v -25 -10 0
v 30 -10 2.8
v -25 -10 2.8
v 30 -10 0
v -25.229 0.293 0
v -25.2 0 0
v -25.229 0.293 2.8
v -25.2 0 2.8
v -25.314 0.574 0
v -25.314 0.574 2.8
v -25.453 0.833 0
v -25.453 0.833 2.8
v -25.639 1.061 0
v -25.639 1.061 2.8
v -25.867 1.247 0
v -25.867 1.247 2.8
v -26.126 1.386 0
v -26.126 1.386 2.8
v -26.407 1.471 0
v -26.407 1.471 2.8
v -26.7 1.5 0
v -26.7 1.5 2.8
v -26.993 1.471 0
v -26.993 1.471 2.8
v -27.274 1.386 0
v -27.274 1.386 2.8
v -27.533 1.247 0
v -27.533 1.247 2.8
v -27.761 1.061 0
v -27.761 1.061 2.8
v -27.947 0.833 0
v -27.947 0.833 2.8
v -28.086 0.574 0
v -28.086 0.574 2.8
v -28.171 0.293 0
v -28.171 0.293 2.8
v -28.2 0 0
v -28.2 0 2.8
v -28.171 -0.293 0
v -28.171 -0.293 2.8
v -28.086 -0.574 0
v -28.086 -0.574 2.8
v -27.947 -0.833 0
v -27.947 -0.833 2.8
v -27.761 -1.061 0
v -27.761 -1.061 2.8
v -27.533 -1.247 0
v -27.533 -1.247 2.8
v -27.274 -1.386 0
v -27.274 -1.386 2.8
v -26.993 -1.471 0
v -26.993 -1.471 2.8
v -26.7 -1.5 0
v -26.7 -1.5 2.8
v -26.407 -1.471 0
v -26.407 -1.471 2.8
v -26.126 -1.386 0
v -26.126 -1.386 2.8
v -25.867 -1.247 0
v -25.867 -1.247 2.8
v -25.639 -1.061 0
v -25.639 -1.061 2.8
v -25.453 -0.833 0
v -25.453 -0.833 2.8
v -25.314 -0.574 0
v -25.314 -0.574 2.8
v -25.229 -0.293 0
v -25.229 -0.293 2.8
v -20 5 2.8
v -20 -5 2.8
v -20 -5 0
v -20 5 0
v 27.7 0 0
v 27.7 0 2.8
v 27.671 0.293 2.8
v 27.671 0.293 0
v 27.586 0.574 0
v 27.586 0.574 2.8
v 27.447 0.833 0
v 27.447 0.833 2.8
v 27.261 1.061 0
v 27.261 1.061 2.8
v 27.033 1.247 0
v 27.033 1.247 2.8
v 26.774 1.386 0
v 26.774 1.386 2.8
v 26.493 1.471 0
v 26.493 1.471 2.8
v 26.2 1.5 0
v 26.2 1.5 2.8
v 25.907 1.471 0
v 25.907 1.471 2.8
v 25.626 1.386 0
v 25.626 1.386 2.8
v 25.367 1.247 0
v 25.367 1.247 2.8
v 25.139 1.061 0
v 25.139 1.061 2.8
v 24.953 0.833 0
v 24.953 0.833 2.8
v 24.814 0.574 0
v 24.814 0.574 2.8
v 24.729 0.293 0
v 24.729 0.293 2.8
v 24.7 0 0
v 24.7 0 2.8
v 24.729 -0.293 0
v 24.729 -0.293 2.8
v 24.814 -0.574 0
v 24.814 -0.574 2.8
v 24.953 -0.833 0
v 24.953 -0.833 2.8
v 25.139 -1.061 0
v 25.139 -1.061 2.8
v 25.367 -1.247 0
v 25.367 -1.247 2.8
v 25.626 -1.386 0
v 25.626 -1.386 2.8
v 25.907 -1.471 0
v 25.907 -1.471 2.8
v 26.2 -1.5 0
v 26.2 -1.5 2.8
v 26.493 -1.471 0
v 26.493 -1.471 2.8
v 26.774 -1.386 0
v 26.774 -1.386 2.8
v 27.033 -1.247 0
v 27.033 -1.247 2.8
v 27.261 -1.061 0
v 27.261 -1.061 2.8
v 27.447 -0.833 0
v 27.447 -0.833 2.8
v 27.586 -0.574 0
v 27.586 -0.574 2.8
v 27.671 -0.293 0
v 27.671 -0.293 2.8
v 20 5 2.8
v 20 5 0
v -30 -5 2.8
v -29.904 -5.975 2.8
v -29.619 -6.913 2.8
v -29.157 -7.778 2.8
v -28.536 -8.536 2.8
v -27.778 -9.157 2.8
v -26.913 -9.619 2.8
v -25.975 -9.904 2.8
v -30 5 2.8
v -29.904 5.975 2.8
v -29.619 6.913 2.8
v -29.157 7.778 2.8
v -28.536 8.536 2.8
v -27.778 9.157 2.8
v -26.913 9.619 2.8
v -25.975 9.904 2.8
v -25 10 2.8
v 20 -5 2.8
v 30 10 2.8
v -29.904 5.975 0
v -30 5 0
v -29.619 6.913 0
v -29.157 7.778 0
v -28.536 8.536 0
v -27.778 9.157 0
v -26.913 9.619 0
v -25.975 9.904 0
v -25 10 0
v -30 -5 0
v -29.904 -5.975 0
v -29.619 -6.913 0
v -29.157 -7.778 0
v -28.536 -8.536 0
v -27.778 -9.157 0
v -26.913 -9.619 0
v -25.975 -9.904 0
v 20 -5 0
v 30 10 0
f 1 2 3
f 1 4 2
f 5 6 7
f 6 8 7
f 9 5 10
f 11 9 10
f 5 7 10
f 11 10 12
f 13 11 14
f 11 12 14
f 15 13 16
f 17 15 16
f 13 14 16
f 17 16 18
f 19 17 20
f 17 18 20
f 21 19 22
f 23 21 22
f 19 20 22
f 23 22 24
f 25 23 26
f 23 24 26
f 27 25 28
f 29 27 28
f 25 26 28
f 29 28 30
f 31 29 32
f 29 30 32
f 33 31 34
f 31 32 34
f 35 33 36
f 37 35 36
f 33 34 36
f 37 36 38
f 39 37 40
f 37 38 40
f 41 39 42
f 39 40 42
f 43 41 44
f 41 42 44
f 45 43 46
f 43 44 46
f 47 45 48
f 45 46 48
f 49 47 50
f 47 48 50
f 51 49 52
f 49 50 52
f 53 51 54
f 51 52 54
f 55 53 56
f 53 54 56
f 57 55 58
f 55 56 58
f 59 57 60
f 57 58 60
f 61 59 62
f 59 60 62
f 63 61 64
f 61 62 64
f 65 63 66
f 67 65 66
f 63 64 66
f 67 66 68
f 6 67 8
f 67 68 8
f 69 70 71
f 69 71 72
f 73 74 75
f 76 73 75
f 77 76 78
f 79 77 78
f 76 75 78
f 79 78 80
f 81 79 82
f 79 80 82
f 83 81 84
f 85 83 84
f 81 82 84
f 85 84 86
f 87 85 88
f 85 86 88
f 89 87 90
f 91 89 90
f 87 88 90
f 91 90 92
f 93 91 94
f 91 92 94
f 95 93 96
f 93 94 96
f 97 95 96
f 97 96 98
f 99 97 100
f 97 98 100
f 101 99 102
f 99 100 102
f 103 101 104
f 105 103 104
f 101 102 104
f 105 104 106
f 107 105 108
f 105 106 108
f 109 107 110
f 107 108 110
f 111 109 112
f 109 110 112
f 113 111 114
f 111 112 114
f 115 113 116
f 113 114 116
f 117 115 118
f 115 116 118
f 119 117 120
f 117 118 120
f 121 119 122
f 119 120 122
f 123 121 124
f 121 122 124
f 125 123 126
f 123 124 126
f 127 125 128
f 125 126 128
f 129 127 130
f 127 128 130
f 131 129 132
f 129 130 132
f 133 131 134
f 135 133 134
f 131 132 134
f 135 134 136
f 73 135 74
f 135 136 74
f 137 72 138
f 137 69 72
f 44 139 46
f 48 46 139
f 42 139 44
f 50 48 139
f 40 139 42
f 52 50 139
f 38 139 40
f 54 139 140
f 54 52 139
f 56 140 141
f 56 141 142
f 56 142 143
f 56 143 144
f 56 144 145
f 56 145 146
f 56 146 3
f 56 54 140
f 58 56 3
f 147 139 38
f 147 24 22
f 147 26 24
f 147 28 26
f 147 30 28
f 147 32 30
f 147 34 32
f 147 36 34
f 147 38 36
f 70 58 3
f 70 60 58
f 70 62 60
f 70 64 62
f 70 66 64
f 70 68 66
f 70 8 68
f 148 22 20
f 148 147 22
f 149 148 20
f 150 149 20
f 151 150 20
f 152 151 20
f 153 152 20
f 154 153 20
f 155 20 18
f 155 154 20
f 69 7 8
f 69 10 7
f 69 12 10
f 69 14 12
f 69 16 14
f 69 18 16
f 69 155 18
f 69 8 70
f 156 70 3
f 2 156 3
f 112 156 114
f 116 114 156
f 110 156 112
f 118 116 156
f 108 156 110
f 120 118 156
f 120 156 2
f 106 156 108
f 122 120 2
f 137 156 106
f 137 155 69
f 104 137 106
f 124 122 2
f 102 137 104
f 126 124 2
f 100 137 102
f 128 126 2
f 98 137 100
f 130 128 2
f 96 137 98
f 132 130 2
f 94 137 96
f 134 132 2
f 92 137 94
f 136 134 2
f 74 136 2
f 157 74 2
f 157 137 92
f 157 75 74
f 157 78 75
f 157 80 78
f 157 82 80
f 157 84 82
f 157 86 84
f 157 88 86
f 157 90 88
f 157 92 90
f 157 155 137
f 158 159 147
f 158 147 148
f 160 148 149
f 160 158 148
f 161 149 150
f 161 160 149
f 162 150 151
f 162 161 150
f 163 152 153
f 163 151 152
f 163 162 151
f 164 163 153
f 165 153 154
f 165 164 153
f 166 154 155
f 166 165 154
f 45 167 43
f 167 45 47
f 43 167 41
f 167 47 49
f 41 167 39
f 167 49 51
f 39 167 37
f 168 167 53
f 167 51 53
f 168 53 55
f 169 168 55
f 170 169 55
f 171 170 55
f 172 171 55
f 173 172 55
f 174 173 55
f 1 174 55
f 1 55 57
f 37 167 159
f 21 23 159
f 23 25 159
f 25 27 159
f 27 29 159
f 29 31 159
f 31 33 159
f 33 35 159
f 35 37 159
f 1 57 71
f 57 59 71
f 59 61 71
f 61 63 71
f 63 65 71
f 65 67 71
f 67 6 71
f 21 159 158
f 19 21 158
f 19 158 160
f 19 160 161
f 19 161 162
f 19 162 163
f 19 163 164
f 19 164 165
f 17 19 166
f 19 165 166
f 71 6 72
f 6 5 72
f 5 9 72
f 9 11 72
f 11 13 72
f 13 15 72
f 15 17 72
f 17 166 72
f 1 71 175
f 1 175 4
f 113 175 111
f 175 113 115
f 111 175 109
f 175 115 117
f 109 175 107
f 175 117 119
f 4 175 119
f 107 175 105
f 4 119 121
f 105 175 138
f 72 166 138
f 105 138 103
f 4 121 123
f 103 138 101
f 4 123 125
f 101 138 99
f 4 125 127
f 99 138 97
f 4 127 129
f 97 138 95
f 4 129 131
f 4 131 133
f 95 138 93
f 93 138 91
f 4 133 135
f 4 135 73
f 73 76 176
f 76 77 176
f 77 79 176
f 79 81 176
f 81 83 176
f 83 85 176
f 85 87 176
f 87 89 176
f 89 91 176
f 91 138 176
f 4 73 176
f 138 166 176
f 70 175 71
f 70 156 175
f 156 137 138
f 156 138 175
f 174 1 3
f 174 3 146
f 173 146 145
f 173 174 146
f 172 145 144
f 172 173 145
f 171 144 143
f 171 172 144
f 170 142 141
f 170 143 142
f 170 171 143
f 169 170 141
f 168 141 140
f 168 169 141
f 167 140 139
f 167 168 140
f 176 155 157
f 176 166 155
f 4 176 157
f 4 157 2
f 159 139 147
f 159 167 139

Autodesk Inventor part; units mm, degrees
ref_plane "YZ Plane" through (0, 0, 0) normal (1, 0, 0) x (0, 1, 0)
ref_plane "XZ Plane" through (0, 0, 0) normal (0, 1, 0) x (-1, 0, 0)
ref_plane "XY Plane" through (0, 0, 0) normal (0, 0, 1) x (1, 0, 0)
sketch "Sketch1" plane through (0, 0, 0) normal (0, 0, 1) x (1, 0, 0)
  line L0 (-43.2426, 0) -> (42.2071, 0) projected
  line L1 (0, -15.4497) -> (0, 15.4497) projected
  line L2 (-25, 10) -> (30, 10)
  line L3 (30, 10) -> (30, -10)
  line L4 (30, -10) -> (-25, -10)
  line L5 (-30, -5) -> (-30, 5)
  arc A0 (-25, 10) -> (-30, 5) centre (-25, 5) ccw
  arc A1 (-30, -5) -> (-25, -10) centre (-25, -5) ccw
  point P0 (0, 0)
  point P1 (-30, 10)
  point P2 (-30, -10)
  dimension "d0" = 60
  dimension "d1" = 20
  dimension "d2" = 30
  dimension "d3" = 10
  dimension "d6" = 5
extrude "Extrusion1" add sketch "Sketch1" along normal blind 2.8
sketch "Sketch2" plane through (0, 0, 2.8) normal (0, 0, 1) x (1, 0, 0)
  line L0 (30, 10) -> (30, -10) projected
  line L1 (-30, -5) -> (-30, 5) projected
  circle A0 centre (-26.7, 0) radius 1.5
  circle A1 centre (26.2, 0) radius 1.5
  line L2 (-25, 10) -> (30, 10) projected
  line L3 (-20, 5) -> (20, 5)
  line L4 (20, 5) -> (20, -5)
  line L5 (20, -5) -> (-20, -5)
  line L6 (-20, -5) -> (-20, 5)
  point P0 (0, 0)
  dimension "d7" = 3
  dimension "d8" = 3
  dimension "d9" = 3.8
  dimension "d10" = 3.3
  dimension "d13" = 40
  dimension "d14" = 10
  dimension "d15" = 5
  dimension "d16" = 20
extrude "Extrusion2" cut sketch "Sketch2" against normal blind 10
equation "\"d2\" = 0.5 * d0"
equation "\"d3\" = 0.5 * d1"
properties part number "Acrylic_PitchServoSupport_1"
